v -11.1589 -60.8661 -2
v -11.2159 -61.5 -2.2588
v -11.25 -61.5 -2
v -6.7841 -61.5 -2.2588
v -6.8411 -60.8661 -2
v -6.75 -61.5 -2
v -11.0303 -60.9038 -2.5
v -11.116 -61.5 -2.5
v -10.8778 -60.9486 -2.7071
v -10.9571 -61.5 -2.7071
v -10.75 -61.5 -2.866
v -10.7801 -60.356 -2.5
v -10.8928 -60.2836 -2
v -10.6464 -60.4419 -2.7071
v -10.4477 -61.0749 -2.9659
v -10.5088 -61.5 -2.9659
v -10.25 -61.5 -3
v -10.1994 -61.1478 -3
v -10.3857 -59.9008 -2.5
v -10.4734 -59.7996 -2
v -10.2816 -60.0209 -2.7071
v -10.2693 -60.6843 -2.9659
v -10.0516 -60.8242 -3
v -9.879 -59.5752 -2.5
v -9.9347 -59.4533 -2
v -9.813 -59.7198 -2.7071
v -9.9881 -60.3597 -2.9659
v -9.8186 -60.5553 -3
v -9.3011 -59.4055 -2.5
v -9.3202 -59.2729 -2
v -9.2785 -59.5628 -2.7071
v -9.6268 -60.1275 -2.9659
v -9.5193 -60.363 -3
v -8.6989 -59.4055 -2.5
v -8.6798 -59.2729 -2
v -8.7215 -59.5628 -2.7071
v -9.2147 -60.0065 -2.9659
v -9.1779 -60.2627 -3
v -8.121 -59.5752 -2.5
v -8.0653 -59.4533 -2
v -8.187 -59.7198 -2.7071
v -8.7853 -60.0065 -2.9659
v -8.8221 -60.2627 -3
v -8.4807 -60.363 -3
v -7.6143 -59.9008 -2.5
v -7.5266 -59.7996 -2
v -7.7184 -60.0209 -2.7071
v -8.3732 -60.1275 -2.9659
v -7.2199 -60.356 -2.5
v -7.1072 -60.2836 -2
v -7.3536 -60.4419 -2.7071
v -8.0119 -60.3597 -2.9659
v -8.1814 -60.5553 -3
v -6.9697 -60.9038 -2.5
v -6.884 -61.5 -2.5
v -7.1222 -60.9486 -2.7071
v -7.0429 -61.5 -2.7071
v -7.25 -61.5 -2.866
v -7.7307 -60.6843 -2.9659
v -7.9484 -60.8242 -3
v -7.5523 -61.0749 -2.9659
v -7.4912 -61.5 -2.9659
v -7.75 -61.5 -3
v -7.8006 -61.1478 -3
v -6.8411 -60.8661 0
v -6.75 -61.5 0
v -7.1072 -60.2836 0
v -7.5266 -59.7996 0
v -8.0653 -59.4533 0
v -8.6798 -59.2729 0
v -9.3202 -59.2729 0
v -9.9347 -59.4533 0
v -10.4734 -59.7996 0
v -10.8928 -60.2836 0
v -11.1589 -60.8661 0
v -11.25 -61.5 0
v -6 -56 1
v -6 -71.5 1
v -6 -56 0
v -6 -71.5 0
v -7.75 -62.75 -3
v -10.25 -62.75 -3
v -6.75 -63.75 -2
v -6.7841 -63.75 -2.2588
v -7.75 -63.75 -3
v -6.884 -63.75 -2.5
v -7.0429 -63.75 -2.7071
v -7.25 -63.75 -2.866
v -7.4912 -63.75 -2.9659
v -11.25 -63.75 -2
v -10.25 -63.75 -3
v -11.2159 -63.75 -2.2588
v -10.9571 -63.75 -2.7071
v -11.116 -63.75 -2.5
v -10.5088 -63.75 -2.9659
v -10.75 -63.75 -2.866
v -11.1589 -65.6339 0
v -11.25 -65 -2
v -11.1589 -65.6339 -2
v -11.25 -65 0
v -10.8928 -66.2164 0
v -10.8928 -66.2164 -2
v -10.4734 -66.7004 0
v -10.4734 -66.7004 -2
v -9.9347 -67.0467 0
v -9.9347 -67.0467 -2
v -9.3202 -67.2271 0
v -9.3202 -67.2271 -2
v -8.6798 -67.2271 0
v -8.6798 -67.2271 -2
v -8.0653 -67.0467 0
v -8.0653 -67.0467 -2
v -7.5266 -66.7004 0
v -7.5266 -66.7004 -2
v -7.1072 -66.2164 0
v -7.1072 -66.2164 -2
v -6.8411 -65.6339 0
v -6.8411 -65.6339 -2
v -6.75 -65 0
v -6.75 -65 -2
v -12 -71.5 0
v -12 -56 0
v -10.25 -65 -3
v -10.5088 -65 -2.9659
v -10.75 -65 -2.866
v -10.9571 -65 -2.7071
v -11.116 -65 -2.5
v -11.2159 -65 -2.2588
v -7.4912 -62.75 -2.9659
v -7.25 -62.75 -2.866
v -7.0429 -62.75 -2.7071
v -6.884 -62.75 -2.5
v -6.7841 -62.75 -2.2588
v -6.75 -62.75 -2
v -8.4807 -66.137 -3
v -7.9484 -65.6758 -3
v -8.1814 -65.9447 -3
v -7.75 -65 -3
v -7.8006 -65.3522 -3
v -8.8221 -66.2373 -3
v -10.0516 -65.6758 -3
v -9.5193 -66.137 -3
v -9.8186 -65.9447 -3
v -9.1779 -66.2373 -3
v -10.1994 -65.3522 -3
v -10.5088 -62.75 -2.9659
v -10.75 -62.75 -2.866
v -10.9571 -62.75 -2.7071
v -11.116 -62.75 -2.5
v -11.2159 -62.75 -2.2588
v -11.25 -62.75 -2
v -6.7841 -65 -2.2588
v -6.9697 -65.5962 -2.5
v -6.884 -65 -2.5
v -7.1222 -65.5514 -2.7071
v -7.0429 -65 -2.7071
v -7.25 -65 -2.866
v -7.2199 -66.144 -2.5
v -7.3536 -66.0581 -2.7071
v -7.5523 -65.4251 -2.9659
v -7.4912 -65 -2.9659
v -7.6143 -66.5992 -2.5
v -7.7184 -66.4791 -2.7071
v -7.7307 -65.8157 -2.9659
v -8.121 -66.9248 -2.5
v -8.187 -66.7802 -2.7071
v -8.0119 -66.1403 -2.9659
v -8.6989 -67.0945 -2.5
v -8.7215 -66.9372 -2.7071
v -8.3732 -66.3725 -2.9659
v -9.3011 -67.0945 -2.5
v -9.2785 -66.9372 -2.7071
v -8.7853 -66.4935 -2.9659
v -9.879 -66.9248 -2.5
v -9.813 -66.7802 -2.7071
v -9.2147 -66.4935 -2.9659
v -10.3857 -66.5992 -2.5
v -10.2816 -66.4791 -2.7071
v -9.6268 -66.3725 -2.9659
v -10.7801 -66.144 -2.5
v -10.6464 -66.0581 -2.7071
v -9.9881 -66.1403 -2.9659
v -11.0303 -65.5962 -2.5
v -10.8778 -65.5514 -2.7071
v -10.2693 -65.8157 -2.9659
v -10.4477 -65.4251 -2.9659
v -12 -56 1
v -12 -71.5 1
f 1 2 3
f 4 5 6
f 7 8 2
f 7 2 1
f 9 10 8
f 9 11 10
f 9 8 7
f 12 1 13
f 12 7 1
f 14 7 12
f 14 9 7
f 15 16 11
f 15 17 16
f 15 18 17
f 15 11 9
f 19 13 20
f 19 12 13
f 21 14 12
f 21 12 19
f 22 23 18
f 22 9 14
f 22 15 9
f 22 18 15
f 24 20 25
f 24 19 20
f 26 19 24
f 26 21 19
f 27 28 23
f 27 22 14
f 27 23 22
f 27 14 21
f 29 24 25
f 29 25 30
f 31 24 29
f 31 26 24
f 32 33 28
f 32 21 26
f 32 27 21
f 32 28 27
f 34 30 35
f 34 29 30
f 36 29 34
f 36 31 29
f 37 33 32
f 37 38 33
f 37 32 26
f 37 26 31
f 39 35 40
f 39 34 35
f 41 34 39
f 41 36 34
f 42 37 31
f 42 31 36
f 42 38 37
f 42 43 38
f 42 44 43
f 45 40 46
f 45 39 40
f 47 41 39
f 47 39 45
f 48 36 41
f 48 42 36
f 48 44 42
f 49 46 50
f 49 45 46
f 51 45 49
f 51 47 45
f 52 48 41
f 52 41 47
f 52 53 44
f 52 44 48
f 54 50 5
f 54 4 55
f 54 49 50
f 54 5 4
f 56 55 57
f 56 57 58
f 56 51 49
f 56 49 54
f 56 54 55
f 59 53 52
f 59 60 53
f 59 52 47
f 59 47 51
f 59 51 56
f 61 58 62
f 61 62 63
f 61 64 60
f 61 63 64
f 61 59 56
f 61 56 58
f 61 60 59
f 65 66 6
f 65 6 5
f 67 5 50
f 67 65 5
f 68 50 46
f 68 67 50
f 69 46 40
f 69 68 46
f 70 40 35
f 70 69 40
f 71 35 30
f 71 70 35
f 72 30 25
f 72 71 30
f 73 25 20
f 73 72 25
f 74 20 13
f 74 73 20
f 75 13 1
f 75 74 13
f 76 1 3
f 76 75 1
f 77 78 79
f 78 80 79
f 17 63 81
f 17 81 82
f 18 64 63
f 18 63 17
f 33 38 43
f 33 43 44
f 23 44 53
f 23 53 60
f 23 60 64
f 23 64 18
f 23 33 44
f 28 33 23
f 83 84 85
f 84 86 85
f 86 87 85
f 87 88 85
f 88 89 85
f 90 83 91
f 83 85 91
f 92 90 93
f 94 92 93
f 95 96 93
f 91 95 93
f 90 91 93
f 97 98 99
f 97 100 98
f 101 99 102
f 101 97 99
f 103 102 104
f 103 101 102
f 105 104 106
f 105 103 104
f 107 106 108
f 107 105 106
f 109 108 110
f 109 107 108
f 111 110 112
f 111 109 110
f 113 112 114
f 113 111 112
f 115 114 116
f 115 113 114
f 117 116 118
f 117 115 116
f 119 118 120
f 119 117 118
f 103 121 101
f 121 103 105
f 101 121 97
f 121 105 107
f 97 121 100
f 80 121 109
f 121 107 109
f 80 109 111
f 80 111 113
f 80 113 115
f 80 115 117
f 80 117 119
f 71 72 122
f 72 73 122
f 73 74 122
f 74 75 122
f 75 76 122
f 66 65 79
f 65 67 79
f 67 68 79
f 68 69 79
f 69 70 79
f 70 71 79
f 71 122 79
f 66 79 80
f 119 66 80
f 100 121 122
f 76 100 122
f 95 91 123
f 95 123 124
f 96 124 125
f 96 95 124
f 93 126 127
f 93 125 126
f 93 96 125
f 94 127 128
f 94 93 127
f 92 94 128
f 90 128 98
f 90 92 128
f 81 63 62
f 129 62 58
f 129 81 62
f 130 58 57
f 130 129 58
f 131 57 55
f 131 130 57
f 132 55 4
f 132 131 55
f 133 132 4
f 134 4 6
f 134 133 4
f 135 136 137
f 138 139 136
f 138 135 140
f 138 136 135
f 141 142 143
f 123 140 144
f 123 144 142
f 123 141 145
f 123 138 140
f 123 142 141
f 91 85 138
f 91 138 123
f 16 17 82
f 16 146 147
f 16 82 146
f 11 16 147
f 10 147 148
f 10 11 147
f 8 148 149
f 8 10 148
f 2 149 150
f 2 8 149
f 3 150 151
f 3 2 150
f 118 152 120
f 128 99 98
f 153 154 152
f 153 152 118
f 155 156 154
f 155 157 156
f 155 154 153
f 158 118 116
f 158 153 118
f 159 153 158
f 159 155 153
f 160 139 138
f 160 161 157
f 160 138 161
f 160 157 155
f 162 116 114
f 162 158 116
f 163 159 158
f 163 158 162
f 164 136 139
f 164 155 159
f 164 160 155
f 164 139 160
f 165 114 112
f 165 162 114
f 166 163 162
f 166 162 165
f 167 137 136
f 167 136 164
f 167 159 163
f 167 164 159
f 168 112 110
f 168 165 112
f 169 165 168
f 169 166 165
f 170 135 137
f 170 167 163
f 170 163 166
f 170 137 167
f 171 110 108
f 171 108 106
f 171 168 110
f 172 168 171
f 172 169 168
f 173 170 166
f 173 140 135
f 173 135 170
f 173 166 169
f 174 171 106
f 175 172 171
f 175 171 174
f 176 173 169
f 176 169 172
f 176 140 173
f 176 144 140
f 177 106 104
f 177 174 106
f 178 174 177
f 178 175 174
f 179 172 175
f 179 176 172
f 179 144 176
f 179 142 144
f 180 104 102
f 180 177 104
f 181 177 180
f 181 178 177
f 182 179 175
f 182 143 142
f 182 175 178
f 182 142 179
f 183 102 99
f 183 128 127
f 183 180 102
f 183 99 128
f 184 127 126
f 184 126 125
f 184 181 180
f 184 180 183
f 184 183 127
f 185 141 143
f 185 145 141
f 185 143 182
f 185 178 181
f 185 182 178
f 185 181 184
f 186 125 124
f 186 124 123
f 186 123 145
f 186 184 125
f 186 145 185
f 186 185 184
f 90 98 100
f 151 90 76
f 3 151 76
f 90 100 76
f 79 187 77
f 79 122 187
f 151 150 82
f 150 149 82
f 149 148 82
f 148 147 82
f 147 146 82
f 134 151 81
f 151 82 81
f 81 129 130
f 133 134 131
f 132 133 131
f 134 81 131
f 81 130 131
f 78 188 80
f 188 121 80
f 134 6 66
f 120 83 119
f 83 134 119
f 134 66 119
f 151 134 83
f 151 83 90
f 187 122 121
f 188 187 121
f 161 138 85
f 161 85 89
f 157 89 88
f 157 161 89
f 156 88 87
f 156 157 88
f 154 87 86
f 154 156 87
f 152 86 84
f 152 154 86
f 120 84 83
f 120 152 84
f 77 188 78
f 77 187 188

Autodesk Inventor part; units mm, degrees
ref_plane "YZ Plane" through (0, 0, 0) normal (1, 0, 0) x (0, 1, 0)
ref_plane "XZ Plane" through (0, 0, 0) normal (0, 1, 0) x (-1, 0, 0)
ref_plane "XY Plane" through (0, 0, 0) normal (0, 0, 1) x (1, 0, 0)
ref_plane "Work Plane1" through (0, 0, -1.5) normal (0, 0, -1) x (-1, 0, 0)
sketch "Sketch1" plane through (0, 0, -1.5) normal (0, 0, -1) x (-1, 0, 0)
  line L0 (11.5, -60) -> (11.5, -65) projected
  arc A0 (9.3, -67.4819) -> (11.5, -65) centre (9, -65) ccw projected
  arc A1 (11.5, -60) -> (9.3, -57.5181) centre (9, -60) ccw projected
  line L1 (15, -75) -> (9.3, -75) projected
  line L2 (15, -5) -> (15, -75) projected
  line L3 (9.3, -5) -> (15, -5) projected
  line L4 (6.75, -60) -> (6.75, -65)
  arc A2 (6.75, -65) -> (11.25, -65) centre (9, -65) ccw
  line L5 (11.25, -65) -> (11.25, -60)
  arc A3 (11.25, -60) -> (6.75, -60) centre (9, -60) ccw
  line L6 (9, -65) -> (9, -61.5) construction
  line L7 (6.75, -65) -> (6.75, -61.5)
  line L8 (11.25, -61.5) -> (11.25, -65)
  arc A4 (6.75, -65) -> (11.25, -65) centre (9, -65) ccw
  arc A5 (11.25, -61.5) -> (6.75, -61.5) centre (9, -61.5) ccw
  line L9 (9.3, -57.5181) -> (9.3, -5) projected
  line L10 (9.3, -75) -> (9.3, -67.4819) projected
  point P0 (0, 0)
  point P1 (9, -63.25)
  dimension "d0" = 0.25
  dimension "d1" = 3.5
extrude "Extrusion1" add sketch "Sketch1" along normal blind 0.5 and the other way blind 1.5 contours A5 L5 A2 L4
sketch "Sketch2" plane through (0, 0, 0) normal (0, 0, 1) x (1, 0, 0)
  line L0 (-6.75, -65) -> (-6.75, -61.5) projected
  arc A0 (-6.75, -61.5) -> (-11.25, -61.5) centre (-9, -61.5) ccw projected
  line L1 (-11.25, -61.5) -> (-11.25, -65) projected
  arc A1 (-11.25, -65) -> (-6.75, -65) centre (-9, -65) ccw projected
  line L2 (-12.5, -69.5) -> (-5.5, -69.5)
  line L3 (-5.5, -69.5) -> (-5.5, -60.5)
  line L4 (-5.5, -60.5) -> (-12.5, -60.5)
  line L5 (-12.5, -60.5) -> (-12.5, -69.5)
  line L6 (-12.5, -69.5) -> (-5.5, -60.5) construction
  line L7 (-5.5, -69.5) -> (-12.5, -60.5) construction
  line L8 (-12.5, -57) -> (-5.5, -57)
  line L9 (-5.5, -57) -> (-5.5, -66)
  line L10 (-5.5, -66) -> (-12.5, -66)
  line L11 (-12.5, -66) -> (-12.5, -57)
  line L12 (-12.5, -57) -> (-5.5, -66) construction
  line L13 (-5.5, -57) -> (-12.5, -66) construction
  point P0 (0, 0)
  dimension "d6" = 7
  dimension "d7" = 7
  dimension "d9" = 9
extrude "Extrusion2" add sketch "Sketch2" along normal blind 1
ref_plane "Work Plane2" through (-10.6833, -67.2, 6.3) normal (-1, 0, 0) x (0, 0, 1)
sketch "Sketch3" plane through (-10.6833, -67.2, 6.3) normal (-1, 0, 0) x (0, 0, 1)
  line L0 (0.322, -0.2398) -> (-0.378, -0.2398) projected
  line L1 (-0.378, -1.4398) -> (-0.378, -0.2398) projected
  line L2 (-0.378, -1.4398) -> (0.322, -1.4398) projected
  line L3 (0.322, -1.4398) -> (0.322, -0.2398) projected
  line L4 (0.272, 0.6602) -> (-1.028, 0.6602)
  line L5 (-1.028, 0.6602) -> (-1.028, -2.3398)
  line L6 (-1.028, -2.3398) -> (0.272, -2.3398)
  line L7 (0.272, -2.3398) -> (0.272, 0.6602)
  line L8 (0.272, 0.6602) -> (-1.028, -2.3398) construction
  line L9 (-1.028, 0.6602) -> (0.272, -2.3398) construction
  line L10 (-1.028, -2.3398) -> (-5.3, -2.3398)
  line L11 (0.272, 0.6602) -> (-5.3, 3.95)
  line L12 (-5.3, -2.3) -> (-5.3, 10.2) projected
  line L13 (-5.3, 3.95) -> (-5.3, -2.3398)
  point P0 (-6.3, 67.2)
  point P1 (-0.378, -0.8398)
  point P2 (-5.3, -0.9)
  point P3 (0.272, -1.4398)
  point P4 (0.272, -0.2398)
  dimension "d12" = 1.3
  dimension "d13" = 3
extrude "Extrusion3" add sketch "Sketch3" along normal mid plane 2 contours L0 L1 L2 L7 L6 L5 L4 | L4 L5 L10 L13 L12 L11
sketch "Sketch4" plane through (-12.5, -69.5, 0) normal (0, -1, 0) x (1, 0, 0)
  point P0 (12.5, 0)
move faces "Move1" translate (0, 0, 0.5) faces at (-6.8944, -63.25, 1)
ref_plane "Work Plane3" through (-9.4833, -47.5, 19.3) normal (-1, 0, 0) x (0, 0, 1)
sketch "Sketch5" plane through (-11.6833, -69.5398, 6.572) normal (0, -1, 0) x (1, 0, 0)
  line L0 (2, 0) -> (0, 0) projected
  line L1 (0, -5.572) -> (0, 0) projected
  line L2 (2, -5.572) -> (0, -5.572) projected
  line L3 (2, 0) -> (2, -5.572) projected
  point P0 (11.6833, -6.572)
extrude "Extrusion4" cut sketch "Sketch5" against normal blind 7
move faces "Move3" translate (0, 0, -0.5) faces at (-6.8944, -63.0133, 1.5)
thicken "Thicken1" operation add thickness 0.5 both sides no extend neighbours yes toward (-1, 0, 0) faces at (-5.5, -65.3333, 0.6667)
thicken "Thicken2" operation add thickness 0.5 both sides no extend neighbours yes toward (1, 0, 0) faces at (-12.5, -61.1667, 0.3333)
thicken "Thicken3" operation add thickness 2 both sides no extend neighbours yes toward (0, -1, 0) faces at (-10, -69.5, 0.6667)
thicken "Thicken4" operation add thickness 1 both sides no extend neighbours yes toward (0, 1, 0) faces at (-8, -57, 0.3333)
move faces "Move4" translate (0, 0, -1) faces at (-9.75, -63.8333, -2)
sketch "Sketch6" plane through (-9, -65, -3) normal (0, 0, -1) x (-1, 0, 0)
  line L0 (-2.25, 3.5) -> (-2.25, 0) projected
  arc A0 (-2.25, 0) -> (2.25, 0) centre (0, 0) ccw projected
  line L1 (2.25, 0) -> (2.25, 3.5) projected
  arc A1 (2.25, 3.5) -> (-2.25, 3.5) centre (0, 3.5) ccw projected
  line L2 (-2.25, 3.5) -> (-2.25, 0) projected
  line L3 (2.25, 2.25) -> (-2.25, 2.25)
  line L4 (-2.25, 2.25) -> (-2.25, 1.25)
  line L5 (-2.25, 1.25) -> (2.25, 1.25)
  line L6 (2.25, 1.25) -> (2.25, 2.25)
  line L7 (2.25, 2.25) -> (-2.25, 1.25) construction
  line L8 (-2.25, 2.25) -> (2.25, 1.25) construction
  point P0 (-9, 65)
  point P1 (0, 1.75)
  point P2 (-2.25, 1.25)
  point P3 (2.25, 1.25)
  point P4 (2.25, 2.25)
  point P5 (-2.25, 2.25)
  dimension "d38" = 1
extrude "Extrusion5" cut sketch "Sketch6" against normal blind 1 contours L3 L1 L5 L0
fillet "Fillet1" radius 1 6 edges at (-6.75, -62.125, -3) (-11.25, -62.125, -3) (-9, -59.25, -3) (-11.25, -64.375, -3) (-6.75, -64.375, -3) (-9, -67.25, -3)
properties part number "switch_a"
